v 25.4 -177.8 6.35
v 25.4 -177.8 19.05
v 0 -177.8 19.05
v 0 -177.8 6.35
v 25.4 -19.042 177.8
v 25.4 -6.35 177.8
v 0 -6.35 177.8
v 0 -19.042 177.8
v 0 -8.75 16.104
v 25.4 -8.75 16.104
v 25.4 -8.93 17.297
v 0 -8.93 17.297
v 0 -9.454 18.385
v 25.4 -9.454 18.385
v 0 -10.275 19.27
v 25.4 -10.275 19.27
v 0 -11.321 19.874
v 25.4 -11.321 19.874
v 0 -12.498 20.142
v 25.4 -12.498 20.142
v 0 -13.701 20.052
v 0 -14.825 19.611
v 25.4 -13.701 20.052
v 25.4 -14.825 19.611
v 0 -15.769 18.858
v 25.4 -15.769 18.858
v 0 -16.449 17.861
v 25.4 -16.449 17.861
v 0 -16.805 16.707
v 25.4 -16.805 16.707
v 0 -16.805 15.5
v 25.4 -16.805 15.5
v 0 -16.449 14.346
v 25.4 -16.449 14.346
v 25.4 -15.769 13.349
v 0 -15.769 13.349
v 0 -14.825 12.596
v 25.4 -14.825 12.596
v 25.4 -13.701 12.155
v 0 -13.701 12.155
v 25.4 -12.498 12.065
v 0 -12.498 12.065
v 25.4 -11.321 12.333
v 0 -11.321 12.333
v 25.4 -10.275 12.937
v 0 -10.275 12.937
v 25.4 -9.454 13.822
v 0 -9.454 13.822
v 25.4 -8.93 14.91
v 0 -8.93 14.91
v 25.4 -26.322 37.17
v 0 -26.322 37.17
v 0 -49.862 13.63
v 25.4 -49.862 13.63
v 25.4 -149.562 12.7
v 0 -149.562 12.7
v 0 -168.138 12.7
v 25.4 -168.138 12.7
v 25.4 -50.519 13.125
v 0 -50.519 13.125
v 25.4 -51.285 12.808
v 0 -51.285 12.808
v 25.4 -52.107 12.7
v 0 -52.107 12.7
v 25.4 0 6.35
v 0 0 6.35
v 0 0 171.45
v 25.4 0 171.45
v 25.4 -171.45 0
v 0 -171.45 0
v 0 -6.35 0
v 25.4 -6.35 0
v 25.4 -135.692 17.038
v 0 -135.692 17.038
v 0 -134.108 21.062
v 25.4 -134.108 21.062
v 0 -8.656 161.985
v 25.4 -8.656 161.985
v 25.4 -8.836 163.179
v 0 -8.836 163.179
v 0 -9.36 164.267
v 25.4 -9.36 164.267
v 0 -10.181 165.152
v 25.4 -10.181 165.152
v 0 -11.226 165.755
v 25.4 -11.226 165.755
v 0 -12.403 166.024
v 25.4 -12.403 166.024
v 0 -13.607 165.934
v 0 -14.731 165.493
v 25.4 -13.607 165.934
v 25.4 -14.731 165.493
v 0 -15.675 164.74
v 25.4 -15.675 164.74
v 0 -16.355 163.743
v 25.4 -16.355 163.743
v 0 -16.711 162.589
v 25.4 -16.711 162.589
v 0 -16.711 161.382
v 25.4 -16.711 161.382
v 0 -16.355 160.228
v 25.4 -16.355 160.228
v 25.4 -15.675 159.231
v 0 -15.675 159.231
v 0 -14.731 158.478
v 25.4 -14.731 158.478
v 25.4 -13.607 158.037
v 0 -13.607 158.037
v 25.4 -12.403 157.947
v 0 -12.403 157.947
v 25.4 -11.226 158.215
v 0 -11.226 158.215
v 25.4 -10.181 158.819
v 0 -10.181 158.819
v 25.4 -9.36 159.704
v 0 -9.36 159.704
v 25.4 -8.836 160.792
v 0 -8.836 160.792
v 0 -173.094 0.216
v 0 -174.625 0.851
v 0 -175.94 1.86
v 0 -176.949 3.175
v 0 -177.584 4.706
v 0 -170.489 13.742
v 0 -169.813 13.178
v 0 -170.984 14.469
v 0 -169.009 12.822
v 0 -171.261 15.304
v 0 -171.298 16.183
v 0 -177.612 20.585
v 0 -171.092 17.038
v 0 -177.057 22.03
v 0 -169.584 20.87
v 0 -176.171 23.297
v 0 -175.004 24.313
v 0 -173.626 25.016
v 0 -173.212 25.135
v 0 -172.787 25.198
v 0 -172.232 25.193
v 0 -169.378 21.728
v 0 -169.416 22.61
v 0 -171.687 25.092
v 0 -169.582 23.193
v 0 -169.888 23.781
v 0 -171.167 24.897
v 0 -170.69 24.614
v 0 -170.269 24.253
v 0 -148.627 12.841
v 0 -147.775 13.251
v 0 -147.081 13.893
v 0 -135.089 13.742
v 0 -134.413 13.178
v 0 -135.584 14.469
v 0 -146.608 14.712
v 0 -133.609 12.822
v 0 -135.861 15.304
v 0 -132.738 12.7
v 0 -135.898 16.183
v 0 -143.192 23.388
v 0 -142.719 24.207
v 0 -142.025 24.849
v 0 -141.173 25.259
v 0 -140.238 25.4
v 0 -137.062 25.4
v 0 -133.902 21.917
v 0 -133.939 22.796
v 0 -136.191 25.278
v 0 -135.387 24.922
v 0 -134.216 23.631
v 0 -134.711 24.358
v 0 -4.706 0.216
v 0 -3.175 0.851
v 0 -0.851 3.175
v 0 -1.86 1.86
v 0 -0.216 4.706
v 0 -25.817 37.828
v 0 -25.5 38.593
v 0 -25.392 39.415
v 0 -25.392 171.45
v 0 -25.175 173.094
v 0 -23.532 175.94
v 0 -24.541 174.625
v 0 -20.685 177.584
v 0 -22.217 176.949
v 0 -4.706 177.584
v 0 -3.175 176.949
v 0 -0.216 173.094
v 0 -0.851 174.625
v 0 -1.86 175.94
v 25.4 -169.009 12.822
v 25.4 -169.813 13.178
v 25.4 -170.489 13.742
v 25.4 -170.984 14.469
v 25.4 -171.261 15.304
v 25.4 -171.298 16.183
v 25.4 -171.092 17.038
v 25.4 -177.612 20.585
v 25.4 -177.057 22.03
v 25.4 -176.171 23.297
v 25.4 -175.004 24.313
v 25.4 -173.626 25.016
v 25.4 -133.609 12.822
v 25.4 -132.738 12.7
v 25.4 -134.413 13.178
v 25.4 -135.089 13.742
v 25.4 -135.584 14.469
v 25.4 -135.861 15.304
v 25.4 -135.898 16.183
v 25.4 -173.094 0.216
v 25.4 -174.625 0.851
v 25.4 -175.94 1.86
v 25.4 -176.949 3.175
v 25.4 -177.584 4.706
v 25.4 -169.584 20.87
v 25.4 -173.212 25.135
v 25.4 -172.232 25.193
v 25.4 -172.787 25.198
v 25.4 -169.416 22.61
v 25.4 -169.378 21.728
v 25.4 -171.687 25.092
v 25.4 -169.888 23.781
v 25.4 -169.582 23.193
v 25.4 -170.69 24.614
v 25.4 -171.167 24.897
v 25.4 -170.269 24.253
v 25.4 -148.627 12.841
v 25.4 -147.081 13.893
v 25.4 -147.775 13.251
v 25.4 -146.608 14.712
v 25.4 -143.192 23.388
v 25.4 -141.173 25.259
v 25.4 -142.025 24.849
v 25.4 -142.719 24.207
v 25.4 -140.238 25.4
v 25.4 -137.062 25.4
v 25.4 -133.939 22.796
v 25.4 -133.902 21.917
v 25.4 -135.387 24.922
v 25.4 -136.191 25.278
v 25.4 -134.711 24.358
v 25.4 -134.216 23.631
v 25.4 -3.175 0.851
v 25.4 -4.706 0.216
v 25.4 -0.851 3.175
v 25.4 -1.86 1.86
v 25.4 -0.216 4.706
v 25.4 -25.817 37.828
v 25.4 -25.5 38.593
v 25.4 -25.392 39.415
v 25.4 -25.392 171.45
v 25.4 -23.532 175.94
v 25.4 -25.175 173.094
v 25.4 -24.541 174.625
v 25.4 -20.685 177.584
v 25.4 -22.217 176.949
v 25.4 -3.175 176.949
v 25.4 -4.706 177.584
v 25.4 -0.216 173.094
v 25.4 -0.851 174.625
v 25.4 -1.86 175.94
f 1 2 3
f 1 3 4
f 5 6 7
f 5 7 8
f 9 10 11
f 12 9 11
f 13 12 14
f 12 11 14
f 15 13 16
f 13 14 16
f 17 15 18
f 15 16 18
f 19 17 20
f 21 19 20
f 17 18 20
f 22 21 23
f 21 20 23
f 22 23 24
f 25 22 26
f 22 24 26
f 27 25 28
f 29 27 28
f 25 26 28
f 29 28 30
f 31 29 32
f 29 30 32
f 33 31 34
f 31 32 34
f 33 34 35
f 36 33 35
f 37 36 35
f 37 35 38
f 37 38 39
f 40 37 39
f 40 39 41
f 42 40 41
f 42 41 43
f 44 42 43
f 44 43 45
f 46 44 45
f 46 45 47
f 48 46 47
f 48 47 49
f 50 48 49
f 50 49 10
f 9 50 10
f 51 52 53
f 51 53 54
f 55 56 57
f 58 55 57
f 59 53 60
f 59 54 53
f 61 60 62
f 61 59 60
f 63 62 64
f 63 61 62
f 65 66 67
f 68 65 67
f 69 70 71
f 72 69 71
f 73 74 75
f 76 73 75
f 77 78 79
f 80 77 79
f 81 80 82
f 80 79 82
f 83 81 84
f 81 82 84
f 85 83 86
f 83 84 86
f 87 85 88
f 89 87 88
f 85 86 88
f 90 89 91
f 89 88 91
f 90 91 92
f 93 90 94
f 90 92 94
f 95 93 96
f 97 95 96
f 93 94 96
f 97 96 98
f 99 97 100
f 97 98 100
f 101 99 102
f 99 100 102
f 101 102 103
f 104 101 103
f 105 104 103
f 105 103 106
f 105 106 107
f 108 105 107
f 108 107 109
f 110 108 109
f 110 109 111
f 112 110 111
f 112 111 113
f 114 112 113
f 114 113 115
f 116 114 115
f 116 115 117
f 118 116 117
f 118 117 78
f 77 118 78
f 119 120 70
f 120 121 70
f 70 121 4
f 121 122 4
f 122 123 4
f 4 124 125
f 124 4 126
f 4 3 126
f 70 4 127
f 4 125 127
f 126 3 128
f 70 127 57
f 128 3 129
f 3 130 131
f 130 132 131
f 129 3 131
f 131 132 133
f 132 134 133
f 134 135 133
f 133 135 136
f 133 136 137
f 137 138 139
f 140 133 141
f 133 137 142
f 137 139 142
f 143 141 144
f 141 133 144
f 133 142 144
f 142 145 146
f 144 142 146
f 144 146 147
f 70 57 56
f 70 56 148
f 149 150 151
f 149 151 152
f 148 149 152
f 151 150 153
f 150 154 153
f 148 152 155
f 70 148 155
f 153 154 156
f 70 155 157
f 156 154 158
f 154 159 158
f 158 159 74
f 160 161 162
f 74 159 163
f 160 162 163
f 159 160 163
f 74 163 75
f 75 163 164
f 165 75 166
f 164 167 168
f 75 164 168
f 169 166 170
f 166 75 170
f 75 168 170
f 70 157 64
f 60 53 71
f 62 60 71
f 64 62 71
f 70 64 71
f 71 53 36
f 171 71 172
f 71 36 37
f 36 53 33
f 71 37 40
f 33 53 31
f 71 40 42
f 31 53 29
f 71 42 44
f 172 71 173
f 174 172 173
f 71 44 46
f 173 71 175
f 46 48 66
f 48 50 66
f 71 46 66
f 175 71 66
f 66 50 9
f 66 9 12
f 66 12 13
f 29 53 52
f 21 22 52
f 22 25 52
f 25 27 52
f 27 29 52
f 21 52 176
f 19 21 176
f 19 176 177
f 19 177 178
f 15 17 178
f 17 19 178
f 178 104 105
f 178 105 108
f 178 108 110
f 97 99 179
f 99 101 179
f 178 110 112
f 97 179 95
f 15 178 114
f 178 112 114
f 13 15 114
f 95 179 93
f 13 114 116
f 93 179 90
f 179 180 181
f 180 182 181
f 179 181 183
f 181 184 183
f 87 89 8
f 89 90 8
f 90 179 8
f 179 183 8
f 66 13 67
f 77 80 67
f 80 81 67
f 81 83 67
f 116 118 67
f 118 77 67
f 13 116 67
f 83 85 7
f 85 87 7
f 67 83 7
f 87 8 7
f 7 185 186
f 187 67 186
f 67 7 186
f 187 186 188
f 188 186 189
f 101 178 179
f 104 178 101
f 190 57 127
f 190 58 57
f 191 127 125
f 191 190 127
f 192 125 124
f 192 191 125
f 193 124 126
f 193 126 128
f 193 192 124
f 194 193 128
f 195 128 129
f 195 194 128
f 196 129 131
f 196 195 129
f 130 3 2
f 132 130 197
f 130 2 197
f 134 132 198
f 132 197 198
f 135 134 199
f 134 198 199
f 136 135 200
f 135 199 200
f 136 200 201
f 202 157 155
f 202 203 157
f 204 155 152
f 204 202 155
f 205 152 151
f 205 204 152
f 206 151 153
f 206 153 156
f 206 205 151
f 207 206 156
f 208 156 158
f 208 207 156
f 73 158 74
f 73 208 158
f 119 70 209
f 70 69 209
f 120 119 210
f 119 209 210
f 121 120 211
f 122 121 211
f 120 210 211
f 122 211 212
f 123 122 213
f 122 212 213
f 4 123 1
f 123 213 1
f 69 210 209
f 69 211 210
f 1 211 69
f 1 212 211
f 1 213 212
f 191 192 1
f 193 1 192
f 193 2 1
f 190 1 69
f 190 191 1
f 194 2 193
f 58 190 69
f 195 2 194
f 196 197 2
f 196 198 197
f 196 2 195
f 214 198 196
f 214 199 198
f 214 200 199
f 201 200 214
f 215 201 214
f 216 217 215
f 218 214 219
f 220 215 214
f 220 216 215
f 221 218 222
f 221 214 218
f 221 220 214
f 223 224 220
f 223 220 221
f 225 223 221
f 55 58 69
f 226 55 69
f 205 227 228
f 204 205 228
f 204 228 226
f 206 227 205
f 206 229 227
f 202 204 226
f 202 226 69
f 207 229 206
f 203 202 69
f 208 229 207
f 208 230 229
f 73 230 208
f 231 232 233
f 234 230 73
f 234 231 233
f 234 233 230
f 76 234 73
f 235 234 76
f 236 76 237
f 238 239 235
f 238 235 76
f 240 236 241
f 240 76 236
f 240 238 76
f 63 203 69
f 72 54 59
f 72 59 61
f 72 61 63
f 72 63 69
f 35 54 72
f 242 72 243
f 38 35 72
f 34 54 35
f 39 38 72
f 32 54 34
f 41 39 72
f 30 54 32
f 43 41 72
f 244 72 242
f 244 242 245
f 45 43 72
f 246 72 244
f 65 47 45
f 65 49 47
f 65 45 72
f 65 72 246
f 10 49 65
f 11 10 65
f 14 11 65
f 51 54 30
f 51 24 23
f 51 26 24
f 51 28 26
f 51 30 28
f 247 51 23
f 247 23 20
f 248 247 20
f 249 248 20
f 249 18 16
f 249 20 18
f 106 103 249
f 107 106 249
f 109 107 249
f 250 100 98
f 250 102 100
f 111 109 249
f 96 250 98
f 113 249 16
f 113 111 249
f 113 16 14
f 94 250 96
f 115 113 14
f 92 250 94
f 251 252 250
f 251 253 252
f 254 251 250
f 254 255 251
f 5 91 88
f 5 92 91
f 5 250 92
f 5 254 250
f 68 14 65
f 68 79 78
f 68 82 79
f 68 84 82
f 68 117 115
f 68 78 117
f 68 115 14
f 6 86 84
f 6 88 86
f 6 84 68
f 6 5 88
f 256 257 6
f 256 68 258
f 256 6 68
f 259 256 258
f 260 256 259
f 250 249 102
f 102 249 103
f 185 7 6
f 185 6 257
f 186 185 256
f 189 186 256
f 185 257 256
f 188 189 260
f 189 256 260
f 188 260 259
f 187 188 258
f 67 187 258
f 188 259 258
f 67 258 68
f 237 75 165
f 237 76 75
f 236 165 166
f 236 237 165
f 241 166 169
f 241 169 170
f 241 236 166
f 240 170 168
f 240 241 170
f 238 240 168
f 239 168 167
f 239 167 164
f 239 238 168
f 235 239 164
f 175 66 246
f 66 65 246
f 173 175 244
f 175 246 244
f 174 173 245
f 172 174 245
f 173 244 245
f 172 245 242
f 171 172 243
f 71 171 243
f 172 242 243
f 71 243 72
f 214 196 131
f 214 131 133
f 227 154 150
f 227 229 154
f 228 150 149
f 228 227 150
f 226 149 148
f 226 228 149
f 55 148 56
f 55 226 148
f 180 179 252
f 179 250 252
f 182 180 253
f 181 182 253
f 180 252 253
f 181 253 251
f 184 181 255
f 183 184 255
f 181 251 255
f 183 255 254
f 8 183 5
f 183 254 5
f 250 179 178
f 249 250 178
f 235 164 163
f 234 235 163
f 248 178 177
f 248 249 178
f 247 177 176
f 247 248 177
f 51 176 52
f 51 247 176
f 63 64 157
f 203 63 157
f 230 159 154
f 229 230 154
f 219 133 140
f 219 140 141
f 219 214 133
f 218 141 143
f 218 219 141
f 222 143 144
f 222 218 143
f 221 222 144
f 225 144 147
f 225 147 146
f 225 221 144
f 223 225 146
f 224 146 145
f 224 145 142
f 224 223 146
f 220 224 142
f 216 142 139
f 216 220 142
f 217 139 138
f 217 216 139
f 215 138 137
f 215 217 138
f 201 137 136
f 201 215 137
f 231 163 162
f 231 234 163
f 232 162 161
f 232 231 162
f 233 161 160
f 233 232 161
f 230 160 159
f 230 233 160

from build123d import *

# Parameters (mm, degrees)
F1_DEPTH = 25.4
F2_SIZE  = 25.4
F3_R     = 6.35
F4_R     = 3.175
F5_R     = 4.05
F6_DEPTH = 25.4010001


with BuildPart() as f1:
    # F0 (on Right) → F1 (new body)
    with BuildSketch(Plane.YZ):
        Polygon((-177.8, 0), (0, 0), (0, 177.8), (-25.3918121044, 177.8), (-25.3918121044, 12.7), (-137.4, 12.7), (-132.4, 25.4), (-142.4, 25.4), (-147.4, 12.7), (-172.8, 12.7), (-167.8, 25.4), (-177.8, 25.4), align=None)
    extrude(amount=F1_DEPTH)

    # F2
    f2_edges = [f1.edges().sort_by_distance(p)[0] for p in [
        (12.7, -25.391812, 12.7),
    ]]
    chamfer(f2_edges, length=F2_SIZE)

    # F3
    f3_edges = [f1.edges().sort_by_distance(p)[0] for p in [
        (12.7, 0, 0),
        (12.7, 0, 177.8),
        (12.7, -25.391812, 177.8),
        (12.7, -177.8, 25.4),
        (12.7, -177.8, 0),
    ]]
    fillet(f3_edges, radius=F3_R)

    # F4
    f4_edges = [f1.edges().sort_by_distance(p)[0] for p in [
        (12.7, -172.8, 12.7),
        (12.7, -137.4, 12.7),
        (12.7, -147.4, 12.7),
        (12.7, -142.4, 25.4),
        (12.7, -132.4, 25.4),
        (12.7, -167.8, 25.4),
        (12.7, -25.391812, 38.1),
        (12.7, -50.791812, 12.7),
    ]]
    fillet(f4_edges, radius=F4_R)

    # F5 (on face) → F6 (cut, through all)
    with BuildSketch(Plane.YZ.offset(25.4)):
        with Locations((-12.7061052421, 161.9854427668)):
            Circle(F5_R)
        with Locations((-12.8001880162, 16.1035214467)):
            Circle(F5_R)
    extrude(amount=-F6_DEPTH, mode=Mode.SUBTRACT)


solid = f1.part
